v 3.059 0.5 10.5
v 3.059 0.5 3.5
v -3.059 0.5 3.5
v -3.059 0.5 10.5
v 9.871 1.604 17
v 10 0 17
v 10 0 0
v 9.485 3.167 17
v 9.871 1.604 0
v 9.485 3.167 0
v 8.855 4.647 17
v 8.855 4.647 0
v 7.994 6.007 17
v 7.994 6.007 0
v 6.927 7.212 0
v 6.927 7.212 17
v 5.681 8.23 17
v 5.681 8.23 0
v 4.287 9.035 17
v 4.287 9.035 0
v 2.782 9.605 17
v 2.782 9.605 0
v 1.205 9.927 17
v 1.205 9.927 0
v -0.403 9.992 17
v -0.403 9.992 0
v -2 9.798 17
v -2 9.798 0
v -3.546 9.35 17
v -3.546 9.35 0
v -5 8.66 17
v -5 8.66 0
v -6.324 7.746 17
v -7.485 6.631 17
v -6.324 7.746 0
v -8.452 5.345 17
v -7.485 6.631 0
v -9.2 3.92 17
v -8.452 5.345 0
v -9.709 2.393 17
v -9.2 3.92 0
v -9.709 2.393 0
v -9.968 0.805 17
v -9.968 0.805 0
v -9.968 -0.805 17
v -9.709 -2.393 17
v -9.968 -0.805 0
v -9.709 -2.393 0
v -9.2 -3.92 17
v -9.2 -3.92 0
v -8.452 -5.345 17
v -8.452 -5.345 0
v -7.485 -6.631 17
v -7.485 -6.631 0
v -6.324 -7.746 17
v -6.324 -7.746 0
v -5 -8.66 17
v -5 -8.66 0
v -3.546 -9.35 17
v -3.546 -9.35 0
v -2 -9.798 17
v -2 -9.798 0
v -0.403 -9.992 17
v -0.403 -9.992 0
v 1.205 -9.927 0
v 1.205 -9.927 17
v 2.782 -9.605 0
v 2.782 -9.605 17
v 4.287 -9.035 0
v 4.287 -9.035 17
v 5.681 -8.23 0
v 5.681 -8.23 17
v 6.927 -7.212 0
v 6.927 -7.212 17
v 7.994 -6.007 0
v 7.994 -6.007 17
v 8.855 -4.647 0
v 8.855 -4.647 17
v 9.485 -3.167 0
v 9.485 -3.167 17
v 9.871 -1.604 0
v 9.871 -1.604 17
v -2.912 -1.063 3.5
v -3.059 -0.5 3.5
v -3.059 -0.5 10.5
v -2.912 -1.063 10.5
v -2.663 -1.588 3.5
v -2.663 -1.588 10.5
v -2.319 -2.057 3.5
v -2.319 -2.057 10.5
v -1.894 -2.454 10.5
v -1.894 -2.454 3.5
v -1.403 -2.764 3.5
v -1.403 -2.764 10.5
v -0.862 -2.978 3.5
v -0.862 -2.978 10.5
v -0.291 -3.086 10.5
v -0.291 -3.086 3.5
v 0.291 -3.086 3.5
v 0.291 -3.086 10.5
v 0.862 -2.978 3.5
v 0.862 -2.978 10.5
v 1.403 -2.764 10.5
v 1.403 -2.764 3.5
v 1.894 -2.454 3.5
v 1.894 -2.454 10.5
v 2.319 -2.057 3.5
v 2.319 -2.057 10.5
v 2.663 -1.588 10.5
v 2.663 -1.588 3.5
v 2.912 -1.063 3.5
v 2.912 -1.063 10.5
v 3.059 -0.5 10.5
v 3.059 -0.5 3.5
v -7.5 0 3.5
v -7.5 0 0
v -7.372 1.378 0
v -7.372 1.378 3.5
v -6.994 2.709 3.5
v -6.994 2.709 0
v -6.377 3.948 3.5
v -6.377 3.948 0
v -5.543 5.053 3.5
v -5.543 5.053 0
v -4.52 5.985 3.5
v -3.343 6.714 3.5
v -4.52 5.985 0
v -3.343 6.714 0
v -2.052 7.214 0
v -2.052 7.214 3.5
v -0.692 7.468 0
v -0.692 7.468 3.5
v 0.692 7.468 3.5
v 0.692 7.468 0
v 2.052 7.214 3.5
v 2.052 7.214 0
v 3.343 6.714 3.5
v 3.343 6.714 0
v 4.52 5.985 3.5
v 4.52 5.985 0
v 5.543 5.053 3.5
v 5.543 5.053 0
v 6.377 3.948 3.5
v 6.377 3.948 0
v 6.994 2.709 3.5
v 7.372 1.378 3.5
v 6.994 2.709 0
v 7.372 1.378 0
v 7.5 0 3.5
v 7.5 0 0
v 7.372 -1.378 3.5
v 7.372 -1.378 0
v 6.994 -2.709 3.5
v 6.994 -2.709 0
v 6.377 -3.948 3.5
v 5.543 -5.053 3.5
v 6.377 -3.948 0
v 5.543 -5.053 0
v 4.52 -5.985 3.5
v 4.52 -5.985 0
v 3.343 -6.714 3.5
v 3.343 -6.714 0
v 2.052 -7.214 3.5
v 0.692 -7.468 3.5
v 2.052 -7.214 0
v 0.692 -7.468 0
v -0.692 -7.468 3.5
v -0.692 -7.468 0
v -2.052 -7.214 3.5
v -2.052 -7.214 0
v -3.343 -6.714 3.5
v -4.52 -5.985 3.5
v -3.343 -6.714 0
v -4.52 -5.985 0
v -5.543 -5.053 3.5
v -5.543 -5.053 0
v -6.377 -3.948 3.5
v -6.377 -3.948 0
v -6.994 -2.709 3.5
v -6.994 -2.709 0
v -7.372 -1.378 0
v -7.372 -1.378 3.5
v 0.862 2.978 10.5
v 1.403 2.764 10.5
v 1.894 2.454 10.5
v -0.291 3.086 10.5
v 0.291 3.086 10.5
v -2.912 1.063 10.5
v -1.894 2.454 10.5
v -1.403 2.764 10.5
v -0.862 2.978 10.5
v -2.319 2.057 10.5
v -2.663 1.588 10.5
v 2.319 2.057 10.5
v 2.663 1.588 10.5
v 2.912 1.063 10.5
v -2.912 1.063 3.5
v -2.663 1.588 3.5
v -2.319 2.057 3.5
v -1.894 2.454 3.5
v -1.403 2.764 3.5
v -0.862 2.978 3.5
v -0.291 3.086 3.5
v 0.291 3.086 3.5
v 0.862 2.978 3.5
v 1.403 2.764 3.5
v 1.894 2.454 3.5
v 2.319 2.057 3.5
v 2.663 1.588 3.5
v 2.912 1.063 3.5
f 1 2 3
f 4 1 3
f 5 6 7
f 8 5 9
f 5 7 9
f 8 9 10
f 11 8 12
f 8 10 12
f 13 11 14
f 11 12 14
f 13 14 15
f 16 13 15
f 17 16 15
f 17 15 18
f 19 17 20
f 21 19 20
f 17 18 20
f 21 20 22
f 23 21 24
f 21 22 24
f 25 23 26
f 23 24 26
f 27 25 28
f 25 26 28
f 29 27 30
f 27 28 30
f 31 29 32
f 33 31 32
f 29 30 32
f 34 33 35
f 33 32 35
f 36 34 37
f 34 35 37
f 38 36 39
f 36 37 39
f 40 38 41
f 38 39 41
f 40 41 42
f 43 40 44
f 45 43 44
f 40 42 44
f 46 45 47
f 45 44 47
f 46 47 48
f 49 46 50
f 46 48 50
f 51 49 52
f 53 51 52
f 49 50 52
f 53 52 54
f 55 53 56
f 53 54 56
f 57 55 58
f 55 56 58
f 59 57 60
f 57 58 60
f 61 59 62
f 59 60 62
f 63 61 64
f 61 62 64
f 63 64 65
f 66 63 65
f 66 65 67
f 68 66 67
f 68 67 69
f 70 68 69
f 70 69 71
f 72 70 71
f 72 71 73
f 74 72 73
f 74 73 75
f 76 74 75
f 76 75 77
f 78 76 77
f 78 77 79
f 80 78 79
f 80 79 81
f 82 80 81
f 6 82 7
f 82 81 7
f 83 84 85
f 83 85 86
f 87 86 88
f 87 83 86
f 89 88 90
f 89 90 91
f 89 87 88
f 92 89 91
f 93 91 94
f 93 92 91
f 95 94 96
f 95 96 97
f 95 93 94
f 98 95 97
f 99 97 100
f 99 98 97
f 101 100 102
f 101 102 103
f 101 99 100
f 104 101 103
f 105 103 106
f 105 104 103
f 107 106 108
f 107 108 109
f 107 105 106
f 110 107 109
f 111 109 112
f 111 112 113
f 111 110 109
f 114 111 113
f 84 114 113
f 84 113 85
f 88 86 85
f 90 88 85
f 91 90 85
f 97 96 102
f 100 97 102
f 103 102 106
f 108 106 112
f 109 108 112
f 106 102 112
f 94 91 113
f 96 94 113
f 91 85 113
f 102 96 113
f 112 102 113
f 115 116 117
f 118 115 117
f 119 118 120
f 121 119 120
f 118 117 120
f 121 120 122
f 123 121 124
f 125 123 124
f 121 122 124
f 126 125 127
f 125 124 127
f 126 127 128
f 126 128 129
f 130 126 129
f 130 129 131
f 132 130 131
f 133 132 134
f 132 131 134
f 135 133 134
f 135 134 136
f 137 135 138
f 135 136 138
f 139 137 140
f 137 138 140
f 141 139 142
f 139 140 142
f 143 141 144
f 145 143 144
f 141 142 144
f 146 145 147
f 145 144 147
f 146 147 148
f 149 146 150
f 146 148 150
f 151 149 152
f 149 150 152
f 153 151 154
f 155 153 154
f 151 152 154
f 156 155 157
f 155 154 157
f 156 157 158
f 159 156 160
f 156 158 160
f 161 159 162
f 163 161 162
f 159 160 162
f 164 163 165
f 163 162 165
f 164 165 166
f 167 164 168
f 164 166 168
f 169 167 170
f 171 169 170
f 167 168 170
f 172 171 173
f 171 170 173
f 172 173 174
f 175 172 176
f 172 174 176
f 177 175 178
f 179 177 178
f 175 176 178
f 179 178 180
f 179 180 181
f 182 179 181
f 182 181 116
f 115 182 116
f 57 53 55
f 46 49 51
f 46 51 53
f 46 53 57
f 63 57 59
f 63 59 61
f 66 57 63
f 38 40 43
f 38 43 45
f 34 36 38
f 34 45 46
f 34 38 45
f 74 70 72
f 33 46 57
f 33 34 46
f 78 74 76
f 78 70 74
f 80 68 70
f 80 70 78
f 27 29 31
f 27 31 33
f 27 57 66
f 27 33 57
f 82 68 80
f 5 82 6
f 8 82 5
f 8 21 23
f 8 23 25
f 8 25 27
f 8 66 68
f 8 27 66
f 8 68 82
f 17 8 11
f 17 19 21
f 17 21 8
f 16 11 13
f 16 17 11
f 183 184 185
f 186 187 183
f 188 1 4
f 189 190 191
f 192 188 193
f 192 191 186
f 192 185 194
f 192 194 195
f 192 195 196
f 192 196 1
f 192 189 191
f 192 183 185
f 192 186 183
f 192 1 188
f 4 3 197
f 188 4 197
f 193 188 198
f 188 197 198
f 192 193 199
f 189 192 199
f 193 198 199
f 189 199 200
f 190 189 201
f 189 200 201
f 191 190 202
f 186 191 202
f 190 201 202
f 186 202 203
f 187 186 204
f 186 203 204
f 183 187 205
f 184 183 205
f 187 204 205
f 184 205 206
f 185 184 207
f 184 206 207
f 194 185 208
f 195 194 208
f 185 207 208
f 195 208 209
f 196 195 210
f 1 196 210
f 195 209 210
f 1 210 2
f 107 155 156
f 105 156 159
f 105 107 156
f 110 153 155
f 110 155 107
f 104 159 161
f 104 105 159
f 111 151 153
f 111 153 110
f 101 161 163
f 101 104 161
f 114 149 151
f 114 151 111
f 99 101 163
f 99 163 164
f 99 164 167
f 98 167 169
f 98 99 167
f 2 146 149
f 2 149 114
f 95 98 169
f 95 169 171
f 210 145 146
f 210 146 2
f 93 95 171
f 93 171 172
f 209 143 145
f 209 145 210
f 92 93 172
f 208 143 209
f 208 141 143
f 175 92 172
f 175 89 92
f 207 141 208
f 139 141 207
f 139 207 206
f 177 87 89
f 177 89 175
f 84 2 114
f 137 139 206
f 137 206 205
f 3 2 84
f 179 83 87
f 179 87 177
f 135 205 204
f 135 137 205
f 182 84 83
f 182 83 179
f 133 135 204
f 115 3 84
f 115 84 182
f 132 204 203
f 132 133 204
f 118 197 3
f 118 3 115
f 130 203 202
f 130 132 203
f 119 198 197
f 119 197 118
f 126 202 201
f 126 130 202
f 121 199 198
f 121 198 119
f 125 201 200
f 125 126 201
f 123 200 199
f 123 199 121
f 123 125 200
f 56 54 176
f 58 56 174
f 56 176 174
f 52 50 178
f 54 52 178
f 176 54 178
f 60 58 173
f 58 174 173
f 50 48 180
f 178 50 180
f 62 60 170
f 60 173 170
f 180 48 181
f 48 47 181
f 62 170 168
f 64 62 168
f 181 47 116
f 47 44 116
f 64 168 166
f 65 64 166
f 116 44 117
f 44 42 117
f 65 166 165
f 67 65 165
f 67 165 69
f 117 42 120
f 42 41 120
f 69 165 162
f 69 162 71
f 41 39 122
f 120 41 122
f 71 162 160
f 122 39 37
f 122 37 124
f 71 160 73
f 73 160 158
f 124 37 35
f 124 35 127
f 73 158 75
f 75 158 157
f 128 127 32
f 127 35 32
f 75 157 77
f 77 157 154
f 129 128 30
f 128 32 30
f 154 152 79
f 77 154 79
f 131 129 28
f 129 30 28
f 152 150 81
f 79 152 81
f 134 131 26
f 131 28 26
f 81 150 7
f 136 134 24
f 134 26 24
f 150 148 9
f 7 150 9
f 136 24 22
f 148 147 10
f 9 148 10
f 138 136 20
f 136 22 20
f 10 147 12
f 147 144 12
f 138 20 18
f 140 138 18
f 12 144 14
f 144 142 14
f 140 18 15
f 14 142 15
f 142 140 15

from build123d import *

# Parameters (mm, degrees)
SKETCH1_R           = 10
BOSS_EXTRUDE1_DEPTH = 17
SKETCH2_R           = 7.5
CUT_EXTRUDE1_DEPTH  = 3.5
CUT_EXTRUDE2_DEPTH  = 7


with BuildPart() as part:
    # Sketch1 → Boss-Extrude1 (new body)
    with BuildSketch(Plane.XY):
        Circle(SKETCH1_R)
    extrude(amount=BOSS_EXTRUDE1_DEPTH)

    # Sketch2 → Cut-Extrude1 (cut)
    with BuildSketch(Plane(origin=(0, 0, 0), x_dir=(-1, 0, 0), z_dir=(0, 0, -1))):
        Circle(SKETCH2_R)
    extrude(amount=-CUT_EXTRUDE1_DEPTH, mode=Mode.SUBTRACT)

    # Sketch4 → Cut-Extrude2 (cut)
    with BuildSketch(Plane(origin=(0, 0, 3.5), x_dir=(-1, 0, 0), z_dir=(0, 0, -1))):
        with BuildLine():
            Line((-3.059411708, 0.5), (3.059411708, 0.5))
            ThreePointArc((3.059411708, 0.5), (0, 3.1), (-3.059411708, 0.5))
        make_face()
        with BuildLine():
            Line((-3.059411708, -0.5), (3.059411708, -0.5))
            ThreePointArc((3.059411708, -0.5), (0, -3.1), (-3.059411708, -0.5))
        make_face()
    extrude(amount=-CUT_EXTRUDE2_DEPTH, mode=Mode.SUBTRACT)


solid = part.part
